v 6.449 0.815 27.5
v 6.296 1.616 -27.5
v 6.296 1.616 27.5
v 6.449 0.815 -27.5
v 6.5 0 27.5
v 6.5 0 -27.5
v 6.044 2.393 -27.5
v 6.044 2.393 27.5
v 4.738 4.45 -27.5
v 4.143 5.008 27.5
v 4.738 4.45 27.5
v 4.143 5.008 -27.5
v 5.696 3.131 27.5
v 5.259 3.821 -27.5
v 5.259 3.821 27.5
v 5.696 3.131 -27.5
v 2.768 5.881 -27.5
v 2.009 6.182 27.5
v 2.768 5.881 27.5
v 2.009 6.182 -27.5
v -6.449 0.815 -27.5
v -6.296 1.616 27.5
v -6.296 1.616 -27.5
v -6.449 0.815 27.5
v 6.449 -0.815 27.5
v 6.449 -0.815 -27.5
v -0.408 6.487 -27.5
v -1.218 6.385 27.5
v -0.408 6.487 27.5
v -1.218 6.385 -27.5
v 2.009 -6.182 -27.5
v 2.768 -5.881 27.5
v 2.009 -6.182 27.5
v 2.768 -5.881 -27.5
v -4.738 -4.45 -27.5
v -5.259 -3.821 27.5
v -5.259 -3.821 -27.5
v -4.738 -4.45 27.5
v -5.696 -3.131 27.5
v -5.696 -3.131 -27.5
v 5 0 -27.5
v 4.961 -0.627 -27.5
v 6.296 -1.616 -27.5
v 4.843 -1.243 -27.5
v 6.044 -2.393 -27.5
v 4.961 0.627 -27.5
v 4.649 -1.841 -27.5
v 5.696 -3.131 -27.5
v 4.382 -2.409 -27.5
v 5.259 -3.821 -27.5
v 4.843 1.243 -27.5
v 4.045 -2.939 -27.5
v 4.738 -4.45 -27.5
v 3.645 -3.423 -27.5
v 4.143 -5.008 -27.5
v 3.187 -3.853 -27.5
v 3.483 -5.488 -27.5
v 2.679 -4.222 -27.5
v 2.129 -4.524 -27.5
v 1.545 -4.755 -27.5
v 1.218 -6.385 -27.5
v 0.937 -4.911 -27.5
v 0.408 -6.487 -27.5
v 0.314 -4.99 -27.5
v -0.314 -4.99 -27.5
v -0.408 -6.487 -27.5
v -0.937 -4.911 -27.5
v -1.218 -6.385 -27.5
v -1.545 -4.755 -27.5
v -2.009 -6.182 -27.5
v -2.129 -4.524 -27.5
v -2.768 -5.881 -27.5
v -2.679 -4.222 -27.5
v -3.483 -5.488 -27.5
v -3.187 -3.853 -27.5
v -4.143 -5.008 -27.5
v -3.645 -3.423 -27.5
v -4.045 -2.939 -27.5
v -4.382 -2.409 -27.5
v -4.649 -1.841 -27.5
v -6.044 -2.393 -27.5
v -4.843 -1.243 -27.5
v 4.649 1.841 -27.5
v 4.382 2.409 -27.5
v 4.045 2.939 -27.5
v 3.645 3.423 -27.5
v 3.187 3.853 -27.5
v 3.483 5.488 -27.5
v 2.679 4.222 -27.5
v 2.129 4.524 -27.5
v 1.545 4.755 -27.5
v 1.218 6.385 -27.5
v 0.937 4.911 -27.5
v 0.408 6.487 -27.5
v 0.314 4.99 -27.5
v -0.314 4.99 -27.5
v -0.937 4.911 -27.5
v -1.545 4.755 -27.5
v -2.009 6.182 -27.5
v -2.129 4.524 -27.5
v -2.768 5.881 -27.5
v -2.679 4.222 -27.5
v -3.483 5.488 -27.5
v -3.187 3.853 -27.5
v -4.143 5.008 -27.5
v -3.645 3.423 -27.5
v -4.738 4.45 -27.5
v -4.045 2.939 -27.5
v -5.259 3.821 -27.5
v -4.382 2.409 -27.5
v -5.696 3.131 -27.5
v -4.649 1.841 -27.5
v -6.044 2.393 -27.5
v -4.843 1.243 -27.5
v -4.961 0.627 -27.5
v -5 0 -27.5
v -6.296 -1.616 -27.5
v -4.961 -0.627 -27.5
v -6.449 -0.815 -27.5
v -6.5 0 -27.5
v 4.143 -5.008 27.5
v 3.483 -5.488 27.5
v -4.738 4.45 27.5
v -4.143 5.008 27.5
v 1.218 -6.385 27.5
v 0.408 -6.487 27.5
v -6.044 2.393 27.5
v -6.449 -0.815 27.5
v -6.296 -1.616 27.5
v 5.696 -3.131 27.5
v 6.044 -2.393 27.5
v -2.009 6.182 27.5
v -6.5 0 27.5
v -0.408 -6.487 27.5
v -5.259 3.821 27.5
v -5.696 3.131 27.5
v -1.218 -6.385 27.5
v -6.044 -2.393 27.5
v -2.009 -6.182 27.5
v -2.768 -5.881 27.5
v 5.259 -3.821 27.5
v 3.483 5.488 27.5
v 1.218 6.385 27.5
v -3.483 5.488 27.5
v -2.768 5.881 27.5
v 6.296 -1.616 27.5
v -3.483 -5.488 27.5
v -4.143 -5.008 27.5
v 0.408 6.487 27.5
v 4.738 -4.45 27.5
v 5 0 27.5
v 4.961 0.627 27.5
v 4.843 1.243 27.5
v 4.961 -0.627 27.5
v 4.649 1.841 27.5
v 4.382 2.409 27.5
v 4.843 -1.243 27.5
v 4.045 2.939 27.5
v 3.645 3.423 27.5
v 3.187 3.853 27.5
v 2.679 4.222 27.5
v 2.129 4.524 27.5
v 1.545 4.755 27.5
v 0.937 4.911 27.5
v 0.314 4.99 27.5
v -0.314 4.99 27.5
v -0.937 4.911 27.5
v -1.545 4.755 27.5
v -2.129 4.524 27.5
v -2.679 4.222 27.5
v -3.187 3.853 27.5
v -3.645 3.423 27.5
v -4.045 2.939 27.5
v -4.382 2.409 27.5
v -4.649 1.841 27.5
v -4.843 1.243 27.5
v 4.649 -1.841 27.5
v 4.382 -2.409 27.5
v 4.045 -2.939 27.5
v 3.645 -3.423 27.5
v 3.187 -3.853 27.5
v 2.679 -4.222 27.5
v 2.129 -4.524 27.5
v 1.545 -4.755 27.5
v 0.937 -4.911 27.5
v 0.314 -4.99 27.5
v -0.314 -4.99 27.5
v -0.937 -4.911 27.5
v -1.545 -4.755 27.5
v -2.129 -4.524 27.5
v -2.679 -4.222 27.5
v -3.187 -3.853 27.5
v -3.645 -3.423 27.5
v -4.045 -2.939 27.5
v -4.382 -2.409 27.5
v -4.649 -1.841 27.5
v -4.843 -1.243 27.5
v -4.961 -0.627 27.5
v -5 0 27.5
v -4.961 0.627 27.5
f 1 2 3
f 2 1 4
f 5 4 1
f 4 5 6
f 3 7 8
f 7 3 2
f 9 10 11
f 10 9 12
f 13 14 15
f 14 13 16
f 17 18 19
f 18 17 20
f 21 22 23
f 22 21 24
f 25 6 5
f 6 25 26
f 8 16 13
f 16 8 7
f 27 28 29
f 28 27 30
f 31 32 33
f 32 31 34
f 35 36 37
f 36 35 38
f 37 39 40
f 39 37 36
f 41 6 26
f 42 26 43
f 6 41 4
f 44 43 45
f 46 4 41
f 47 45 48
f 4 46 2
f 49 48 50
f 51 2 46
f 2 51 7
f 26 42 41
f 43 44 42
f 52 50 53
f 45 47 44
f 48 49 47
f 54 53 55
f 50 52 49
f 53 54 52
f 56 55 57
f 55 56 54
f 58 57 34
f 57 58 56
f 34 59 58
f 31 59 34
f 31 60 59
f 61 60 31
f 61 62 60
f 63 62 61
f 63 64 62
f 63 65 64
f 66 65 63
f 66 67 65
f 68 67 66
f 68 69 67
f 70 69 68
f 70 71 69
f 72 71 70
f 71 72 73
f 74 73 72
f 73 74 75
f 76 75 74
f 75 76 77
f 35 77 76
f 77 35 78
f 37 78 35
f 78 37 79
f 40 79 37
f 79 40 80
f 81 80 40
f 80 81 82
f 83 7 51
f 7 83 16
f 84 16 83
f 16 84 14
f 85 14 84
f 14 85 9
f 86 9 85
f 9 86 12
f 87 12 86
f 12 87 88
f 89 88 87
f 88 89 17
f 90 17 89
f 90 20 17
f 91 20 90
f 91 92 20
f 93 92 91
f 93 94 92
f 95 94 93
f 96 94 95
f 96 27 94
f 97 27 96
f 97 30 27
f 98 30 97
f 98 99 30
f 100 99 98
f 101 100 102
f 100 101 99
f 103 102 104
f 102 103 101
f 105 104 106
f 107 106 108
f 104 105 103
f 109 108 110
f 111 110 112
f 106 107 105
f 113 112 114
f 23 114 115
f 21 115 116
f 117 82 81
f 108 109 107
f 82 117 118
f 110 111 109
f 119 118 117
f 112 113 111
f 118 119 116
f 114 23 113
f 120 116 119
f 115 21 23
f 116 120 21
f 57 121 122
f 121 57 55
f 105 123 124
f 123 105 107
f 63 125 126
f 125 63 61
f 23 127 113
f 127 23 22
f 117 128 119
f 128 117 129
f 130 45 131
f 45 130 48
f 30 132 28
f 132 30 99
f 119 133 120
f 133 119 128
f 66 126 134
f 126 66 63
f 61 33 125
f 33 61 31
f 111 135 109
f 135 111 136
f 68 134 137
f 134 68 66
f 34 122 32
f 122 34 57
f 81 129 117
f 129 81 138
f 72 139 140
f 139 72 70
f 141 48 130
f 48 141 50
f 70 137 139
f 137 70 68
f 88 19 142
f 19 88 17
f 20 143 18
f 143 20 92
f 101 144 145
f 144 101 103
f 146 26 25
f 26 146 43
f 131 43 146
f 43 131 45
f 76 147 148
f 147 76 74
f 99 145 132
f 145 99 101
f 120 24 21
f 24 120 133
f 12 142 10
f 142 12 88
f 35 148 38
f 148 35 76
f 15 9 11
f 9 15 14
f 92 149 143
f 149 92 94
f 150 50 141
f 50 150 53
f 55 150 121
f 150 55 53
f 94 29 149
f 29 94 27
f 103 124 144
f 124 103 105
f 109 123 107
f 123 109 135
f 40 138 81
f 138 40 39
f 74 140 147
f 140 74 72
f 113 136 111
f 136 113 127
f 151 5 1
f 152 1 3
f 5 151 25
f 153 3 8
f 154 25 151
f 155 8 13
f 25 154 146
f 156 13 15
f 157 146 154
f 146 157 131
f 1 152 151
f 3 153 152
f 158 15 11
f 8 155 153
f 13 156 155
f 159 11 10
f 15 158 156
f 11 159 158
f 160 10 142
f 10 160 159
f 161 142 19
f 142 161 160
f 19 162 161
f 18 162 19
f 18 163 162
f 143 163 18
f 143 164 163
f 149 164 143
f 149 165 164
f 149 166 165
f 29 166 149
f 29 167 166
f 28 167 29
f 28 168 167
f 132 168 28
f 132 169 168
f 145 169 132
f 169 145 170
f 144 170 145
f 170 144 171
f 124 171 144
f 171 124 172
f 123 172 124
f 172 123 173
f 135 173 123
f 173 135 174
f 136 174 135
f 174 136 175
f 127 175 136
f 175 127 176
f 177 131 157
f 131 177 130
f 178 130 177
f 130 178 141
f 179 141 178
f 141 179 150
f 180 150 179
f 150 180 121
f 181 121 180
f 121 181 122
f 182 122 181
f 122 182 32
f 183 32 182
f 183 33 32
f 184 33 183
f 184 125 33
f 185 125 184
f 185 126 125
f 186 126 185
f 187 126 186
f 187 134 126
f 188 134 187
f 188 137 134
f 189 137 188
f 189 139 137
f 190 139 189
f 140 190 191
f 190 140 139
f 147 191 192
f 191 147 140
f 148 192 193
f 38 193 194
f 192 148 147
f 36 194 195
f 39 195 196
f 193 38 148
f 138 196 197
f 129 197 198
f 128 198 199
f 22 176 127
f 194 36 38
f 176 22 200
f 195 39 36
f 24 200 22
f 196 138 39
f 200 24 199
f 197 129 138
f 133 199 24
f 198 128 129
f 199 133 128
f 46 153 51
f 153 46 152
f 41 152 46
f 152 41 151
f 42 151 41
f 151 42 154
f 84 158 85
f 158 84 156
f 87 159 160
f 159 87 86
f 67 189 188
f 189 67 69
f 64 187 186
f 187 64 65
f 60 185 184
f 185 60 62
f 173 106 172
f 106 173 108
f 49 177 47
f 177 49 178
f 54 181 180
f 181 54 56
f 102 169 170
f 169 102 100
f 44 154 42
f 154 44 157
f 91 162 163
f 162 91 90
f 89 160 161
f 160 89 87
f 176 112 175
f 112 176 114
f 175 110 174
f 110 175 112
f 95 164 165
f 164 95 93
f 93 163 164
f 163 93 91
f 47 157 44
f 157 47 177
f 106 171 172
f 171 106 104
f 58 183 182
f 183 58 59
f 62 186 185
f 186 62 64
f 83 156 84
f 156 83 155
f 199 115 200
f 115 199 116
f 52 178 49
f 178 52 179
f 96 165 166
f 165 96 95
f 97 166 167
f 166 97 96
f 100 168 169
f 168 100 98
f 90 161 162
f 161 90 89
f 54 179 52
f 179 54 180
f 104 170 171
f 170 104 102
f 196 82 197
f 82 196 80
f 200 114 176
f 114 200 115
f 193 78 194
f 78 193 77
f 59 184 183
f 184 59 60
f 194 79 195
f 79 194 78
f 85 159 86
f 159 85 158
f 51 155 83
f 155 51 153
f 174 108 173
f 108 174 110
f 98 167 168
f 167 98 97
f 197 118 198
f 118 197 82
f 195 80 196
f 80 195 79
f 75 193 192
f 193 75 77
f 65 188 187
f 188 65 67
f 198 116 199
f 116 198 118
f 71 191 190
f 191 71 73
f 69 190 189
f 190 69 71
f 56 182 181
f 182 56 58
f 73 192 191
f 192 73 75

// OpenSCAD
$fn = 50;


difference() {
	union() {
		translate(v = [0, 0, -27.5000000000]) {
			cylinder(h = 55, r = 6.5000000000);
		}
	}
	union() {
		translate(v = [0, 0, -100.0000000000]) {
			cylinder(h = 200, r = 5.0000000000);
		}
	}
}
